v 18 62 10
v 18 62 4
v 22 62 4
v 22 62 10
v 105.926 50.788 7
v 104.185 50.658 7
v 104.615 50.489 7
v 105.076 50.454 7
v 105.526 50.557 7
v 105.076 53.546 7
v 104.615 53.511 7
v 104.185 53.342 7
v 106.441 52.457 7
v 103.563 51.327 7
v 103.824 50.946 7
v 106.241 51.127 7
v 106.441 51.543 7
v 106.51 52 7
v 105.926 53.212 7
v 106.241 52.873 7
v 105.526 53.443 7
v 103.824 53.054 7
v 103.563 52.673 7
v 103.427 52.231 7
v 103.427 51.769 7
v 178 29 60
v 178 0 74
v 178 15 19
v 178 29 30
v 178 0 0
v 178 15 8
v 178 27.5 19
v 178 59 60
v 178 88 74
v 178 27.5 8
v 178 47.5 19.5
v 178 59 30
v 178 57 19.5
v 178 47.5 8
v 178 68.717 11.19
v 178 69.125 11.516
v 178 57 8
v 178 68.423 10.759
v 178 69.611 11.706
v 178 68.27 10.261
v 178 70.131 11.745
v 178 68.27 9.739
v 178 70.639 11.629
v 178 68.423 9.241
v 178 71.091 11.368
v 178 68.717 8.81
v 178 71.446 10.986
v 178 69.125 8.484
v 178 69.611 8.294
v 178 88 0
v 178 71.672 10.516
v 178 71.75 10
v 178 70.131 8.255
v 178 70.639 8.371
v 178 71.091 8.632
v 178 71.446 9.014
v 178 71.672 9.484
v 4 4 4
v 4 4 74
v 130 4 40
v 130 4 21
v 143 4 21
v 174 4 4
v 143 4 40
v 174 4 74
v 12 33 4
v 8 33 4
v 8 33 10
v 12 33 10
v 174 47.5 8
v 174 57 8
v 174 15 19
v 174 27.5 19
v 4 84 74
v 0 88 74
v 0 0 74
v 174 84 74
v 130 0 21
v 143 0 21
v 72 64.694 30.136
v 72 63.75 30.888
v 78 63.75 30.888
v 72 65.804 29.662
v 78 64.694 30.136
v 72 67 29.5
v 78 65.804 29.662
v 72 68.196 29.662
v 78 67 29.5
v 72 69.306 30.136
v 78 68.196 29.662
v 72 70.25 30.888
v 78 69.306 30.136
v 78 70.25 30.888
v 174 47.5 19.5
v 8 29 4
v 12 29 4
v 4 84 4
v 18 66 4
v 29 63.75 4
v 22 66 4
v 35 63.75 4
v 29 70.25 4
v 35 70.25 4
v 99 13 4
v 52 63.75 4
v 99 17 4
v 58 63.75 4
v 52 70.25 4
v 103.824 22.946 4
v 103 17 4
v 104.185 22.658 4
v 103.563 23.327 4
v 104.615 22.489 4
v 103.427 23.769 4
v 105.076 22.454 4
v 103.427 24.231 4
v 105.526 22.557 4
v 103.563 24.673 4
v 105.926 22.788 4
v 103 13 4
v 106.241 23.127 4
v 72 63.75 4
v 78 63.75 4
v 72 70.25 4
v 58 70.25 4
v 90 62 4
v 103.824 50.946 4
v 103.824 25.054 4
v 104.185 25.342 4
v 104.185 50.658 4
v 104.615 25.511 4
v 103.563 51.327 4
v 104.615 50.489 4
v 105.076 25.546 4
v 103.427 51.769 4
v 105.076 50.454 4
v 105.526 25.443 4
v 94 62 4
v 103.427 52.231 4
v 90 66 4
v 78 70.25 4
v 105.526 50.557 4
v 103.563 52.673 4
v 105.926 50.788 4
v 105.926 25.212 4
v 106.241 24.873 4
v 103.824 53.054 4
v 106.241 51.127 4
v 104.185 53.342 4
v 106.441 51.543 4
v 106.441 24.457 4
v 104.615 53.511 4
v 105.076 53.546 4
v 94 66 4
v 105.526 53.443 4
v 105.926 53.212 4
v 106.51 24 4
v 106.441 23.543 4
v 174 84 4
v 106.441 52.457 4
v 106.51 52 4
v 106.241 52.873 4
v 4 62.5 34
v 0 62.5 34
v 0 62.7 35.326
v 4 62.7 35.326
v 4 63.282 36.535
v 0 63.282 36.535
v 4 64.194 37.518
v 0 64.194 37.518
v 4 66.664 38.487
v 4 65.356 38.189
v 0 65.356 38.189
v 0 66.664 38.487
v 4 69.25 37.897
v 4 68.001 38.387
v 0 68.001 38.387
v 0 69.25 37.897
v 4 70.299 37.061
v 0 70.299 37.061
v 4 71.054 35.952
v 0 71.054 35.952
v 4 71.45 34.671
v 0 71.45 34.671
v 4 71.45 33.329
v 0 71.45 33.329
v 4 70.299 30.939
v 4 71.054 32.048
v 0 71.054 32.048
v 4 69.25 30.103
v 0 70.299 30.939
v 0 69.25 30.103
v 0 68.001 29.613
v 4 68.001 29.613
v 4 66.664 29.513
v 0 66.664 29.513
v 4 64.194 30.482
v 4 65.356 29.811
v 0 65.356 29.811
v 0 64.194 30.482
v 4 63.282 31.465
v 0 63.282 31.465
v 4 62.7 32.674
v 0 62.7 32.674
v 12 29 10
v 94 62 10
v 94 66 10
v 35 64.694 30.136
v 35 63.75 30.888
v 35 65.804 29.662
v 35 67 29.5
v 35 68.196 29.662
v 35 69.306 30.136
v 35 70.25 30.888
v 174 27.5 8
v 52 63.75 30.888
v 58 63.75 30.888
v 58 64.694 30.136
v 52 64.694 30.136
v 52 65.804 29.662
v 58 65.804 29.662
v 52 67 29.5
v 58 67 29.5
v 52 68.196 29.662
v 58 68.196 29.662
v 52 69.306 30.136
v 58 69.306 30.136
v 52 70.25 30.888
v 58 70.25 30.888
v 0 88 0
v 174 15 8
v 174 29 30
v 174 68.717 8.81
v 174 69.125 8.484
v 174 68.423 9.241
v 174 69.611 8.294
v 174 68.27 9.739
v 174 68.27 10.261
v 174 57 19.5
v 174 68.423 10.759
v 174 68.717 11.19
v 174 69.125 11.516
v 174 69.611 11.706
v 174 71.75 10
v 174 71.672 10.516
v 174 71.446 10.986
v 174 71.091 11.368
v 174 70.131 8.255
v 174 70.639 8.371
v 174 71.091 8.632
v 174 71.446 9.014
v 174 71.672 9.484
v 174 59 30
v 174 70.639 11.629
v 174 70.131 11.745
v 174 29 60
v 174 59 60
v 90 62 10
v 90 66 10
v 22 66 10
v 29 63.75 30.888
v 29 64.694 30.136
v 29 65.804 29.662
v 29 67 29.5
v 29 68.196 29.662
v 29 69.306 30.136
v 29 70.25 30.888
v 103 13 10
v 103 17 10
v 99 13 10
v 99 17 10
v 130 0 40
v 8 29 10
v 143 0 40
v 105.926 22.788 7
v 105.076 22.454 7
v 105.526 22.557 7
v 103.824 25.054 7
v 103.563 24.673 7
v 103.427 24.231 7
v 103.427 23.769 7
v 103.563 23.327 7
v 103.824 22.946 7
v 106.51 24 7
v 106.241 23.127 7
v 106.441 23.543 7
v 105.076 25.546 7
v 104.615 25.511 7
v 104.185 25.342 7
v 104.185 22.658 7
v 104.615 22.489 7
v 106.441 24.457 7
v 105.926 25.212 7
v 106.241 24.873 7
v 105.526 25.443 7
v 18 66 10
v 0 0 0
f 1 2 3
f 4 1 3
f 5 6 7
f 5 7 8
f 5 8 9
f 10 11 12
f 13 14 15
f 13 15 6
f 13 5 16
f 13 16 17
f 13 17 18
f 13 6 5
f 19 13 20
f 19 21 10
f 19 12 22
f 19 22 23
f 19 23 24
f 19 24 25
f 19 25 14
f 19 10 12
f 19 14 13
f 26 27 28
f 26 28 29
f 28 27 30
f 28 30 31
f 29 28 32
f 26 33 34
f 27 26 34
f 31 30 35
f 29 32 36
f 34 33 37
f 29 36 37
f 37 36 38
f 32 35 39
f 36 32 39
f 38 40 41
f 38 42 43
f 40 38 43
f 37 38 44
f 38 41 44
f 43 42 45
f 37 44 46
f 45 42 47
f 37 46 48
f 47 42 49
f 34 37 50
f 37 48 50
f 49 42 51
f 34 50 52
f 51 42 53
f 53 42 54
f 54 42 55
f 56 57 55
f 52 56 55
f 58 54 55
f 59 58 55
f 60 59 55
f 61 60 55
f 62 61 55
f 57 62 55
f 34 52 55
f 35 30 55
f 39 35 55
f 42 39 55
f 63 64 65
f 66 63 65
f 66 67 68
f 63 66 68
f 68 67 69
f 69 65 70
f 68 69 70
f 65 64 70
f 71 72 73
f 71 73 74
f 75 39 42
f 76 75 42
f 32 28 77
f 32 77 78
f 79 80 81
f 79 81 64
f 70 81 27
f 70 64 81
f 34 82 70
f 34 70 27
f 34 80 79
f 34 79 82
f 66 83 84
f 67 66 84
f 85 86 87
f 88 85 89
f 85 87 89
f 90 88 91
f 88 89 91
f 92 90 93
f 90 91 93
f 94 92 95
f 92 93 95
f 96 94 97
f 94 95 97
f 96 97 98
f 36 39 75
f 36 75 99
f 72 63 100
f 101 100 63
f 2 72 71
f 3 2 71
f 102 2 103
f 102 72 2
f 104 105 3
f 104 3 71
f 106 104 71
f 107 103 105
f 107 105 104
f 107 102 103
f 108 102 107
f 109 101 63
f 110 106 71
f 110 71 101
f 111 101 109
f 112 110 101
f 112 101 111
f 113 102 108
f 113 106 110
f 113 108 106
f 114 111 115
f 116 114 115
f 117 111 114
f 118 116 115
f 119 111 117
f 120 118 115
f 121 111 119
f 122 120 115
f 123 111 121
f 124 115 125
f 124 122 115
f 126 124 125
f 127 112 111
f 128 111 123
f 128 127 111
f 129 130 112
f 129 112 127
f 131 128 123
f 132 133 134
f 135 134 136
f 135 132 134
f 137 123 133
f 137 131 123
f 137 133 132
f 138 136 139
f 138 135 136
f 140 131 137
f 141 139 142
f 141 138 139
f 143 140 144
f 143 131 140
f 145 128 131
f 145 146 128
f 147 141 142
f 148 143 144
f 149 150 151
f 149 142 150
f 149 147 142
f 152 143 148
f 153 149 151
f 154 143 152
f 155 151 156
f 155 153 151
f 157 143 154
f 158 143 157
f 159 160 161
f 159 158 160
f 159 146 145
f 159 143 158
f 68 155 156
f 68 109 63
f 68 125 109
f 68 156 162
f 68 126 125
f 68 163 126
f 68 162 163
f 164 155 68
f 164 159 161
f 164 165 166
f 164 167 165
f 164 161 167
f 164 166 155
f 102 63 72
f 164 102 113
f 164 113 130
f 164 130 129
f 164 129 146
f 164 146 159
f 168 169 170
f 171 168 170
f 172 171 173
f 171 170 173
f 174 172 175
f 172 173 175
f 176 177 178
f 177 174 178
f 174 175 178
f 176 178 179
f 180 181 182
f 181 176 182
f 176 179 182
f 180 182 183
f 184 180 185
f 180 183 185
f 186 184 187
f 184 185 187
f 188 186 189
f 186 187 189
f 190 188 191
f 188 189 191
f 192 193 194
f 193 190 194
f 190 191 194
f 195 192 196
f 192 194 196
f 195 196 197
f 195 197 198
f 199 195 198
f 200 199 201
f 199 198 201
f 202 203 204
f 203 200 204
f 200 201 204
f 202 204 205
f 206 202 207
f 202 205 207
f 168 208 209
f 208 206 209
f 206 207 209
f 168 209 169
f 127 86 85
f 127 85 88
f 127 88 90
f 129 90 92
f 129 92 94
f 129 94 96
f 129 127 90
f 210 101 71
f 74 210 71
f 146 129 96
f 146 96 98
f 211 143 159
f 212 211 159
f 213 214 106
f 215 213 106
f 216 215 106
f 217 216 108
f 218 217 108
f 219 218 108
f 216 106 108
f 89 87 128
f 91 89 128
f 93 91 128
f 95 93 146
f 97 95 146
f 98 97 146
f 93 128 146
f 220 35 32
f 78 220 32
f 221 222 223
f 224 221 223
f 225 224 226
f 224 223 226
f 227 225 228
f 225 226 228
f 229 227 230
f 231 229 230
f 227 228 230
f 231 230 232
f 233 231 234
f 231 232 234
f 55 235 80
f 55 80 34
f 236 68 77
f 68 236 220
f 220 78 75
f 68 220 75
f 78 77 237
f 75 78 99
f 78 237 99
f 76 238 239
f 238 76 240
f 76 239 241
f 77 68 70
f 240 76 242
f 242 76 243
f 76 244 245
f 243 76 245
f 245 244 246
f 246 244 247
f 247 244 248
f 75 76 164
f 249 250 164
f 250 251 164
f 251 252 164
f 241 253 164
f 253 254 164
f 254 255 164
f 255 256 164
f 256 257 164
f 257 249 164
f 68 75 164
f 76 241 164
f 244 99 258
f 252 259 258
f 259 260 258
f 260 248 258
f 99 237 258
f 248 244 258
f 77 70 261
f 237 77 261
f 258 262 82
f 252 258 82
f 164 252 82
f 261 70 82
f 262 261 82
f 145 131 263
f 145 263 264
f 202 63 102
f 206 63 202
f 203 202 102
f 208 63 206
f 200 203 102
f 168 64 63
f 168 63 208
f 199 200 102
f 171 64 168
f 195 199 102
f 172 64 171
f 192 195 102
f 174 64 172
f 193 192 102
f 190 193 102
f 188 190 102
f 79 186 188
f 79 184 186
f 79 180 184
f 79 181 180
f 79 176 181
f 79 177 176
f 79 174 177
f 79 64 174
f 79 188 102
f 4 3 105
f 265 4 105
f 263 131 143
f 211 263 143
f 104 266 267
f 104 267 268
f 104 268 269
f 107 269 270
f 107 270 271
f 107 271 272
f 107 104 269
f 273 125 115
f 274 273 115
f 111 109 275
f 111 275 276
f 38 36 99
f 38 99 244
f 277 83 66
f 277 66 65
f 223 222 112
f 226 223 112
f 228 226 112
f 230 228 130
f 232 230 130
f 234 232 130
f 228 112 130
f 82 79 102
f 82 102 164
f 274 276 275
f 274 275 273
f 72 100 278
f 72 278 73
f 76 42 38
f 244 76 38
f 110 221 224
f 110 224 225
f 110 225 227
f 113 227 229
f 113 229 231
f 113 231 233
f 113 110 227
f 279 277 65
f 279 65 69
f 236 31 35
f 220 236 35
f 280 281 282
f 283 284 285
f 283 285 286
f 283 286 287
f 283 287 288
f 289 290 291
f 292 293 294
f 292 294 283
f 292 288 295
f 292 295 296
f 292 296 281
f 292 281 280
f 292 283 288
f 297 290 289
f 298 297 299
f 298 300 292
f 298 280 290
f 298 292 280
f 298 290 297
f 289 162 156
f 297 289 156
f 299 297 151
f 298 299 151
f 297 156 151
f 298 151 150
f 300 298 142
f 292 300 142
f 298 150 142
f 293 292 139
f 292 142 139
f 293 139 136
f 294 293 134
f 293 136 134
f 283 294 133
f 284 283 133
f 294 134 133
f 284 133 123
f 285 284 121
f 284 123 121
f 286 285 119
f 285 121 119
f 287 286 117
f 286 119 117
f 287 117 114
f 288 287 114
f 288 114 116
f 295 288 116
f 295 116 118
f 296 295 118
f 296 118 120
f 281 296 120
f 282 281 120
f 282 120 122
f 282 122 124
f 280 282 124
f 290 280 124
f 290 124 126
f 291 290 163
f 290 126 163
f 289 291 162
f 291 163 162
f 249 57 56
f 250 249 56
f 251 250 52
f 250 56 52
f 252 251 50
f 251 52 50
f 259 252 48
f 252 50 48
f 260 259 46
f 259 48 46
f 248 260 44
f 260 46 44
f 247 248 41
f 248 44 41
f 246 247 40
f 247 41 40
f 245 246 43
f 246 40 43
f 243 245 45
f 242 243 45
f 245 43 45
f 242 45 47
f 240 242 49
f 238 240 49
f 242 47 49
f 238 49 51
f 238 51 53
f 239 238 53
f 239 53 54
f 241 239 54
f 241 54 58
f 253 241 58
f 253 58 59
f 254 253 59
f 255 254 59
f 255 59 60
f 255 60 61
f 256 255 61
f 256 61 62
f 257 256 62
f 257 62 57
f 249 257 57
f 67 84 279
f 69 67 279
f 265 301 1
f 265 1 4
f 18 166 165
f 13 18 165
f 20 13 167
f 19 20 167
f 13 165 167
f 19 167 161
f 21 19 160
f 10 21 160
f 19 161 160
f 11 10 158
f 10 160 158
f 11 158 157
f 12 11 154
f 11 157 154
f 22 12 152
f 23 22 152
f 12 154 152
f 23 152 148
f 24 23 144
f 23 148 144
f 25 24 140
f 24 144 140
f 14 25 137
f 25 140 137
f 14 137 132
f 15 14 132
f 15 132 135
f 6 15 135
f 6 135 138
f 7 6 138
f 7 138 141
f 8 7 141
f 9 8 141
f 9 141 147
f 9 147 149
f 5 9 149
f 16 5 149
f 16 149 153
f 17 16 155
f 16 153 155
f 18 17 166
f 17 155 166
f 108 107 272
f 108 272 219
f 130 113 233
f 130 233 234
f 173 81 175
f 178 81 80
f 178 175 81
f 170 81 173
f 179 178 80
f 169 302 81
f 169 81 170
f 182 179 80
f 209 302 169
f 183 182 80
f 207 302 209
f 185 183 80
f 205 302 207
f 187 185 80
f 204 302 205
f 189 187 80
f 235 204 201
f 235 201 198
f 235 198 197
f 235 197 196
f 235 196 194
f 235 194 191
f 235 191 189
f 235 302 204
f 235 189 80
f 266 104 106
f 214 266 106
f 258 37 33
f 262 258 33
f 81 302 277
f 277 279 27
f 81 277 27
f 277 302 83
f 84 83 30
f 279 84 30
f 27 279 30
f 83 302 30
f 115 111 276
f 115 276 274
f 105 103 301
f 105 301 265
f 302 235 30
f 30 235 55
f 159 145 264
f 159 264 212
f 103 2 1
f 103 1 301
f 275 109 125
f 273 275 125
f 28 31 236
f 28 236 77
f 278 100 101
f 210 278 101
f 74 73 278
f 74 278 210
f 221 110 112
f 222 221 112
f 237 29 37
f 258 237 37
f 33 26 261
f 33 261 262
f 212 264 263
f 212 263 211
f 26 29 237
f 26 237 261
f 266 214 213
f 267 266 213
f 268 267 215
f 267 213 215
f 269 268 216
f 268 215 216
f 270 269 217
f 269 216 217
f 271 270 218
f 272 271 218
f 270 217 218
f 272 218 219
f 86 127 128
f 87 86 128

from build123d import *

# Parameters (mm, degrees)
SKETCH_W        = 178
SKETCH_H        = 88
PAD_DEPTH       = 74
SKETCH001_W     = 170
SKETCH001_H     = 80
POCKET_DEPTH    = 70
SKETCH002_W     = 12.5
SKETCH002_H     = 11
SKETCH002_W_2   = 9.5
SKETCH002_H_2   = 11.5
POCKET001_DEPTH = 5
SKETCH003_W     = 30
SKETCH003_H     = 30
POCKET002_DEPTH = 5
SKETCH004_W     = 13
SKETCH004_H     = 19
POCKET003_DEPTH = 5
SKETCH005_R     = 4.5
POCKET004_DEPTH = 5
SKETCH006_W     = 6
SKETCH006_H     = 6.5
PAD001_DEPTH    = 30
SKETCH007_R     = 4.5
POCKET005_DEPTH = 90
SKETCH008_R     = 1.55
PAD002_DEPTH    = 3
SKETCH010_R     = 1.75
POCKET006_DEPTH = 5
SKETCH011_W     = 4
SKETCH011_H     = 4
PAD004_DEPTH    = 6


with BuildPart() as part:
    # Sketch → Pad (new body)
    with BuildSketch(Plane.XY):
        with Locations((89, 44)):
            Rectangle(SKETCH_W, SKETCH_H)
    extrude(amount=PAD_DEPTH)

    # Sketch001 (on Face6 of Pad) → Pocket (cut)
    with BuildSketch(Plane.XY.offset(74)):
        with Locations((89, 44)):
            Rectangle(SKETCH001_W, SKETCH001_H)
    extrude(amount=-POCKET_DEPTH, mode=Mode.SUBTRACT)

    # Sketch002 (on Face3 of Pocket) → Pocket001 (cut)
    with BuildSketch(Plane.YZ.offset(178)):
        with Locations((21.25, 13.5)):
            Rectangle(SKETCH002_W, SKETCH002_H)
        with Locations((52.25, 13.75)):
            Rectangle(SKETCH002_W_2, SKETCH002_H_2)
    extrude(amount=-POCKET001_DEPTH, mode=Mode.SUBTRACT)

    # Sketch003 (on Face3 of Pocket001) → Pocket002 (cut)
    with BuildSketch(Plane.YZ.offset(178)):
        with Locations((44, 45)):
            Rectangle(SKETCH003_W, SKETCH003_H)
    extrude(amount=-POCKET002_DEPTH, mode=Mode.SUBTRACT)

    # Sketch004 (on Face1 of Pocket002) → Pocket003 (cut)
    with BuildSketch(Plane.XZ):
        with Locations((136.5, 30.5)):
            Rectangle(SKETCH004_W, SKETCH004_H)
    extrude(amount=-POCKET003_DEPTH, mode=Mode.SUBTRACT)

    # Sketch005 (on Face2 of Pocket003) → Pocket004 (cut)
    with BuildSketch(Plane(origin=(0, 0, 0), x_dir=(0, -1, 0), z_dir=(-1, 0, 0))):
        with Locations((-67, 34)):
            Circle(SKETCH005_R)
    extrude(amount=-POCKET004_DEPTH, mode=Mode.SUBTRACT)

    # Sketch006 (on Face28 of Pocket004) → Pad001 (join)
    with BuildSketch(Plane.XY.offset(4)):
        with Locations((32, 67)):
            Rectangle(SKETCH006_W, SKETCH006_H)
        with Locations((55, 67)):
            Rectangle(SKETCH006_W, SKETCH006_H)
        with Locations((75, 67)):
            Rectangle(SKETCH006_W, SKETCH006_H)
    extrude(amount=PAD001_DEPTH)

    # Sketch007 (on Face31 of Pad001) → Pocket005 (cut)
    with BuildSketch(Plane.YZ.offset(78)):
        with Locations((67, 34)):
            Circle(SKETCH007_R)
    extrude(amount=-POCKET005_DEPTH, mode=Mode.SUBTRACT)

    # Sketch008 (on Face29 of Pocket005) → Pad002 (join)
    with BuildSketch(Plane.XY.offset(4)):
        with Locations((104.96, 52)):
            Circle(SKETCH008_R)
        with Locations((104.96, 24)):
            Circle(SKETCH008_R)
    extrude(amount=PAD002_DEPTH)

    # Sketch010 → Pocket006 (cut)
    with BuildSketch(Plane.YZ.offset(178)):
        with Locations((70, 10)):
            Circle(SKETCH010_R)
    extrude(amount=-POCKET006_DEPTH, mode=Mode.SUBTRACT)

    # Sketch011 (on Face30 of Pocket006) → Pad004 (join)
    with BuildSketch(Plane.XY.offset(4)):
        with Locations((10, 31)):
            Rectangle(SKETCH011_W, SKETCH011_H)
        with Locations((20, 64)):
            Rectangle(SKETCH011_W, SKETCH011_H)
        with Locations((101, 15)):
            Rectangle(SKETCH011_W, SKETCH011_H)
        with Locations((92, 64)):
            Rectangle(SKETCH011_W, SKETCH011_H)
    extrude(amount=PAD004_DEPTH)


solid = part.part
